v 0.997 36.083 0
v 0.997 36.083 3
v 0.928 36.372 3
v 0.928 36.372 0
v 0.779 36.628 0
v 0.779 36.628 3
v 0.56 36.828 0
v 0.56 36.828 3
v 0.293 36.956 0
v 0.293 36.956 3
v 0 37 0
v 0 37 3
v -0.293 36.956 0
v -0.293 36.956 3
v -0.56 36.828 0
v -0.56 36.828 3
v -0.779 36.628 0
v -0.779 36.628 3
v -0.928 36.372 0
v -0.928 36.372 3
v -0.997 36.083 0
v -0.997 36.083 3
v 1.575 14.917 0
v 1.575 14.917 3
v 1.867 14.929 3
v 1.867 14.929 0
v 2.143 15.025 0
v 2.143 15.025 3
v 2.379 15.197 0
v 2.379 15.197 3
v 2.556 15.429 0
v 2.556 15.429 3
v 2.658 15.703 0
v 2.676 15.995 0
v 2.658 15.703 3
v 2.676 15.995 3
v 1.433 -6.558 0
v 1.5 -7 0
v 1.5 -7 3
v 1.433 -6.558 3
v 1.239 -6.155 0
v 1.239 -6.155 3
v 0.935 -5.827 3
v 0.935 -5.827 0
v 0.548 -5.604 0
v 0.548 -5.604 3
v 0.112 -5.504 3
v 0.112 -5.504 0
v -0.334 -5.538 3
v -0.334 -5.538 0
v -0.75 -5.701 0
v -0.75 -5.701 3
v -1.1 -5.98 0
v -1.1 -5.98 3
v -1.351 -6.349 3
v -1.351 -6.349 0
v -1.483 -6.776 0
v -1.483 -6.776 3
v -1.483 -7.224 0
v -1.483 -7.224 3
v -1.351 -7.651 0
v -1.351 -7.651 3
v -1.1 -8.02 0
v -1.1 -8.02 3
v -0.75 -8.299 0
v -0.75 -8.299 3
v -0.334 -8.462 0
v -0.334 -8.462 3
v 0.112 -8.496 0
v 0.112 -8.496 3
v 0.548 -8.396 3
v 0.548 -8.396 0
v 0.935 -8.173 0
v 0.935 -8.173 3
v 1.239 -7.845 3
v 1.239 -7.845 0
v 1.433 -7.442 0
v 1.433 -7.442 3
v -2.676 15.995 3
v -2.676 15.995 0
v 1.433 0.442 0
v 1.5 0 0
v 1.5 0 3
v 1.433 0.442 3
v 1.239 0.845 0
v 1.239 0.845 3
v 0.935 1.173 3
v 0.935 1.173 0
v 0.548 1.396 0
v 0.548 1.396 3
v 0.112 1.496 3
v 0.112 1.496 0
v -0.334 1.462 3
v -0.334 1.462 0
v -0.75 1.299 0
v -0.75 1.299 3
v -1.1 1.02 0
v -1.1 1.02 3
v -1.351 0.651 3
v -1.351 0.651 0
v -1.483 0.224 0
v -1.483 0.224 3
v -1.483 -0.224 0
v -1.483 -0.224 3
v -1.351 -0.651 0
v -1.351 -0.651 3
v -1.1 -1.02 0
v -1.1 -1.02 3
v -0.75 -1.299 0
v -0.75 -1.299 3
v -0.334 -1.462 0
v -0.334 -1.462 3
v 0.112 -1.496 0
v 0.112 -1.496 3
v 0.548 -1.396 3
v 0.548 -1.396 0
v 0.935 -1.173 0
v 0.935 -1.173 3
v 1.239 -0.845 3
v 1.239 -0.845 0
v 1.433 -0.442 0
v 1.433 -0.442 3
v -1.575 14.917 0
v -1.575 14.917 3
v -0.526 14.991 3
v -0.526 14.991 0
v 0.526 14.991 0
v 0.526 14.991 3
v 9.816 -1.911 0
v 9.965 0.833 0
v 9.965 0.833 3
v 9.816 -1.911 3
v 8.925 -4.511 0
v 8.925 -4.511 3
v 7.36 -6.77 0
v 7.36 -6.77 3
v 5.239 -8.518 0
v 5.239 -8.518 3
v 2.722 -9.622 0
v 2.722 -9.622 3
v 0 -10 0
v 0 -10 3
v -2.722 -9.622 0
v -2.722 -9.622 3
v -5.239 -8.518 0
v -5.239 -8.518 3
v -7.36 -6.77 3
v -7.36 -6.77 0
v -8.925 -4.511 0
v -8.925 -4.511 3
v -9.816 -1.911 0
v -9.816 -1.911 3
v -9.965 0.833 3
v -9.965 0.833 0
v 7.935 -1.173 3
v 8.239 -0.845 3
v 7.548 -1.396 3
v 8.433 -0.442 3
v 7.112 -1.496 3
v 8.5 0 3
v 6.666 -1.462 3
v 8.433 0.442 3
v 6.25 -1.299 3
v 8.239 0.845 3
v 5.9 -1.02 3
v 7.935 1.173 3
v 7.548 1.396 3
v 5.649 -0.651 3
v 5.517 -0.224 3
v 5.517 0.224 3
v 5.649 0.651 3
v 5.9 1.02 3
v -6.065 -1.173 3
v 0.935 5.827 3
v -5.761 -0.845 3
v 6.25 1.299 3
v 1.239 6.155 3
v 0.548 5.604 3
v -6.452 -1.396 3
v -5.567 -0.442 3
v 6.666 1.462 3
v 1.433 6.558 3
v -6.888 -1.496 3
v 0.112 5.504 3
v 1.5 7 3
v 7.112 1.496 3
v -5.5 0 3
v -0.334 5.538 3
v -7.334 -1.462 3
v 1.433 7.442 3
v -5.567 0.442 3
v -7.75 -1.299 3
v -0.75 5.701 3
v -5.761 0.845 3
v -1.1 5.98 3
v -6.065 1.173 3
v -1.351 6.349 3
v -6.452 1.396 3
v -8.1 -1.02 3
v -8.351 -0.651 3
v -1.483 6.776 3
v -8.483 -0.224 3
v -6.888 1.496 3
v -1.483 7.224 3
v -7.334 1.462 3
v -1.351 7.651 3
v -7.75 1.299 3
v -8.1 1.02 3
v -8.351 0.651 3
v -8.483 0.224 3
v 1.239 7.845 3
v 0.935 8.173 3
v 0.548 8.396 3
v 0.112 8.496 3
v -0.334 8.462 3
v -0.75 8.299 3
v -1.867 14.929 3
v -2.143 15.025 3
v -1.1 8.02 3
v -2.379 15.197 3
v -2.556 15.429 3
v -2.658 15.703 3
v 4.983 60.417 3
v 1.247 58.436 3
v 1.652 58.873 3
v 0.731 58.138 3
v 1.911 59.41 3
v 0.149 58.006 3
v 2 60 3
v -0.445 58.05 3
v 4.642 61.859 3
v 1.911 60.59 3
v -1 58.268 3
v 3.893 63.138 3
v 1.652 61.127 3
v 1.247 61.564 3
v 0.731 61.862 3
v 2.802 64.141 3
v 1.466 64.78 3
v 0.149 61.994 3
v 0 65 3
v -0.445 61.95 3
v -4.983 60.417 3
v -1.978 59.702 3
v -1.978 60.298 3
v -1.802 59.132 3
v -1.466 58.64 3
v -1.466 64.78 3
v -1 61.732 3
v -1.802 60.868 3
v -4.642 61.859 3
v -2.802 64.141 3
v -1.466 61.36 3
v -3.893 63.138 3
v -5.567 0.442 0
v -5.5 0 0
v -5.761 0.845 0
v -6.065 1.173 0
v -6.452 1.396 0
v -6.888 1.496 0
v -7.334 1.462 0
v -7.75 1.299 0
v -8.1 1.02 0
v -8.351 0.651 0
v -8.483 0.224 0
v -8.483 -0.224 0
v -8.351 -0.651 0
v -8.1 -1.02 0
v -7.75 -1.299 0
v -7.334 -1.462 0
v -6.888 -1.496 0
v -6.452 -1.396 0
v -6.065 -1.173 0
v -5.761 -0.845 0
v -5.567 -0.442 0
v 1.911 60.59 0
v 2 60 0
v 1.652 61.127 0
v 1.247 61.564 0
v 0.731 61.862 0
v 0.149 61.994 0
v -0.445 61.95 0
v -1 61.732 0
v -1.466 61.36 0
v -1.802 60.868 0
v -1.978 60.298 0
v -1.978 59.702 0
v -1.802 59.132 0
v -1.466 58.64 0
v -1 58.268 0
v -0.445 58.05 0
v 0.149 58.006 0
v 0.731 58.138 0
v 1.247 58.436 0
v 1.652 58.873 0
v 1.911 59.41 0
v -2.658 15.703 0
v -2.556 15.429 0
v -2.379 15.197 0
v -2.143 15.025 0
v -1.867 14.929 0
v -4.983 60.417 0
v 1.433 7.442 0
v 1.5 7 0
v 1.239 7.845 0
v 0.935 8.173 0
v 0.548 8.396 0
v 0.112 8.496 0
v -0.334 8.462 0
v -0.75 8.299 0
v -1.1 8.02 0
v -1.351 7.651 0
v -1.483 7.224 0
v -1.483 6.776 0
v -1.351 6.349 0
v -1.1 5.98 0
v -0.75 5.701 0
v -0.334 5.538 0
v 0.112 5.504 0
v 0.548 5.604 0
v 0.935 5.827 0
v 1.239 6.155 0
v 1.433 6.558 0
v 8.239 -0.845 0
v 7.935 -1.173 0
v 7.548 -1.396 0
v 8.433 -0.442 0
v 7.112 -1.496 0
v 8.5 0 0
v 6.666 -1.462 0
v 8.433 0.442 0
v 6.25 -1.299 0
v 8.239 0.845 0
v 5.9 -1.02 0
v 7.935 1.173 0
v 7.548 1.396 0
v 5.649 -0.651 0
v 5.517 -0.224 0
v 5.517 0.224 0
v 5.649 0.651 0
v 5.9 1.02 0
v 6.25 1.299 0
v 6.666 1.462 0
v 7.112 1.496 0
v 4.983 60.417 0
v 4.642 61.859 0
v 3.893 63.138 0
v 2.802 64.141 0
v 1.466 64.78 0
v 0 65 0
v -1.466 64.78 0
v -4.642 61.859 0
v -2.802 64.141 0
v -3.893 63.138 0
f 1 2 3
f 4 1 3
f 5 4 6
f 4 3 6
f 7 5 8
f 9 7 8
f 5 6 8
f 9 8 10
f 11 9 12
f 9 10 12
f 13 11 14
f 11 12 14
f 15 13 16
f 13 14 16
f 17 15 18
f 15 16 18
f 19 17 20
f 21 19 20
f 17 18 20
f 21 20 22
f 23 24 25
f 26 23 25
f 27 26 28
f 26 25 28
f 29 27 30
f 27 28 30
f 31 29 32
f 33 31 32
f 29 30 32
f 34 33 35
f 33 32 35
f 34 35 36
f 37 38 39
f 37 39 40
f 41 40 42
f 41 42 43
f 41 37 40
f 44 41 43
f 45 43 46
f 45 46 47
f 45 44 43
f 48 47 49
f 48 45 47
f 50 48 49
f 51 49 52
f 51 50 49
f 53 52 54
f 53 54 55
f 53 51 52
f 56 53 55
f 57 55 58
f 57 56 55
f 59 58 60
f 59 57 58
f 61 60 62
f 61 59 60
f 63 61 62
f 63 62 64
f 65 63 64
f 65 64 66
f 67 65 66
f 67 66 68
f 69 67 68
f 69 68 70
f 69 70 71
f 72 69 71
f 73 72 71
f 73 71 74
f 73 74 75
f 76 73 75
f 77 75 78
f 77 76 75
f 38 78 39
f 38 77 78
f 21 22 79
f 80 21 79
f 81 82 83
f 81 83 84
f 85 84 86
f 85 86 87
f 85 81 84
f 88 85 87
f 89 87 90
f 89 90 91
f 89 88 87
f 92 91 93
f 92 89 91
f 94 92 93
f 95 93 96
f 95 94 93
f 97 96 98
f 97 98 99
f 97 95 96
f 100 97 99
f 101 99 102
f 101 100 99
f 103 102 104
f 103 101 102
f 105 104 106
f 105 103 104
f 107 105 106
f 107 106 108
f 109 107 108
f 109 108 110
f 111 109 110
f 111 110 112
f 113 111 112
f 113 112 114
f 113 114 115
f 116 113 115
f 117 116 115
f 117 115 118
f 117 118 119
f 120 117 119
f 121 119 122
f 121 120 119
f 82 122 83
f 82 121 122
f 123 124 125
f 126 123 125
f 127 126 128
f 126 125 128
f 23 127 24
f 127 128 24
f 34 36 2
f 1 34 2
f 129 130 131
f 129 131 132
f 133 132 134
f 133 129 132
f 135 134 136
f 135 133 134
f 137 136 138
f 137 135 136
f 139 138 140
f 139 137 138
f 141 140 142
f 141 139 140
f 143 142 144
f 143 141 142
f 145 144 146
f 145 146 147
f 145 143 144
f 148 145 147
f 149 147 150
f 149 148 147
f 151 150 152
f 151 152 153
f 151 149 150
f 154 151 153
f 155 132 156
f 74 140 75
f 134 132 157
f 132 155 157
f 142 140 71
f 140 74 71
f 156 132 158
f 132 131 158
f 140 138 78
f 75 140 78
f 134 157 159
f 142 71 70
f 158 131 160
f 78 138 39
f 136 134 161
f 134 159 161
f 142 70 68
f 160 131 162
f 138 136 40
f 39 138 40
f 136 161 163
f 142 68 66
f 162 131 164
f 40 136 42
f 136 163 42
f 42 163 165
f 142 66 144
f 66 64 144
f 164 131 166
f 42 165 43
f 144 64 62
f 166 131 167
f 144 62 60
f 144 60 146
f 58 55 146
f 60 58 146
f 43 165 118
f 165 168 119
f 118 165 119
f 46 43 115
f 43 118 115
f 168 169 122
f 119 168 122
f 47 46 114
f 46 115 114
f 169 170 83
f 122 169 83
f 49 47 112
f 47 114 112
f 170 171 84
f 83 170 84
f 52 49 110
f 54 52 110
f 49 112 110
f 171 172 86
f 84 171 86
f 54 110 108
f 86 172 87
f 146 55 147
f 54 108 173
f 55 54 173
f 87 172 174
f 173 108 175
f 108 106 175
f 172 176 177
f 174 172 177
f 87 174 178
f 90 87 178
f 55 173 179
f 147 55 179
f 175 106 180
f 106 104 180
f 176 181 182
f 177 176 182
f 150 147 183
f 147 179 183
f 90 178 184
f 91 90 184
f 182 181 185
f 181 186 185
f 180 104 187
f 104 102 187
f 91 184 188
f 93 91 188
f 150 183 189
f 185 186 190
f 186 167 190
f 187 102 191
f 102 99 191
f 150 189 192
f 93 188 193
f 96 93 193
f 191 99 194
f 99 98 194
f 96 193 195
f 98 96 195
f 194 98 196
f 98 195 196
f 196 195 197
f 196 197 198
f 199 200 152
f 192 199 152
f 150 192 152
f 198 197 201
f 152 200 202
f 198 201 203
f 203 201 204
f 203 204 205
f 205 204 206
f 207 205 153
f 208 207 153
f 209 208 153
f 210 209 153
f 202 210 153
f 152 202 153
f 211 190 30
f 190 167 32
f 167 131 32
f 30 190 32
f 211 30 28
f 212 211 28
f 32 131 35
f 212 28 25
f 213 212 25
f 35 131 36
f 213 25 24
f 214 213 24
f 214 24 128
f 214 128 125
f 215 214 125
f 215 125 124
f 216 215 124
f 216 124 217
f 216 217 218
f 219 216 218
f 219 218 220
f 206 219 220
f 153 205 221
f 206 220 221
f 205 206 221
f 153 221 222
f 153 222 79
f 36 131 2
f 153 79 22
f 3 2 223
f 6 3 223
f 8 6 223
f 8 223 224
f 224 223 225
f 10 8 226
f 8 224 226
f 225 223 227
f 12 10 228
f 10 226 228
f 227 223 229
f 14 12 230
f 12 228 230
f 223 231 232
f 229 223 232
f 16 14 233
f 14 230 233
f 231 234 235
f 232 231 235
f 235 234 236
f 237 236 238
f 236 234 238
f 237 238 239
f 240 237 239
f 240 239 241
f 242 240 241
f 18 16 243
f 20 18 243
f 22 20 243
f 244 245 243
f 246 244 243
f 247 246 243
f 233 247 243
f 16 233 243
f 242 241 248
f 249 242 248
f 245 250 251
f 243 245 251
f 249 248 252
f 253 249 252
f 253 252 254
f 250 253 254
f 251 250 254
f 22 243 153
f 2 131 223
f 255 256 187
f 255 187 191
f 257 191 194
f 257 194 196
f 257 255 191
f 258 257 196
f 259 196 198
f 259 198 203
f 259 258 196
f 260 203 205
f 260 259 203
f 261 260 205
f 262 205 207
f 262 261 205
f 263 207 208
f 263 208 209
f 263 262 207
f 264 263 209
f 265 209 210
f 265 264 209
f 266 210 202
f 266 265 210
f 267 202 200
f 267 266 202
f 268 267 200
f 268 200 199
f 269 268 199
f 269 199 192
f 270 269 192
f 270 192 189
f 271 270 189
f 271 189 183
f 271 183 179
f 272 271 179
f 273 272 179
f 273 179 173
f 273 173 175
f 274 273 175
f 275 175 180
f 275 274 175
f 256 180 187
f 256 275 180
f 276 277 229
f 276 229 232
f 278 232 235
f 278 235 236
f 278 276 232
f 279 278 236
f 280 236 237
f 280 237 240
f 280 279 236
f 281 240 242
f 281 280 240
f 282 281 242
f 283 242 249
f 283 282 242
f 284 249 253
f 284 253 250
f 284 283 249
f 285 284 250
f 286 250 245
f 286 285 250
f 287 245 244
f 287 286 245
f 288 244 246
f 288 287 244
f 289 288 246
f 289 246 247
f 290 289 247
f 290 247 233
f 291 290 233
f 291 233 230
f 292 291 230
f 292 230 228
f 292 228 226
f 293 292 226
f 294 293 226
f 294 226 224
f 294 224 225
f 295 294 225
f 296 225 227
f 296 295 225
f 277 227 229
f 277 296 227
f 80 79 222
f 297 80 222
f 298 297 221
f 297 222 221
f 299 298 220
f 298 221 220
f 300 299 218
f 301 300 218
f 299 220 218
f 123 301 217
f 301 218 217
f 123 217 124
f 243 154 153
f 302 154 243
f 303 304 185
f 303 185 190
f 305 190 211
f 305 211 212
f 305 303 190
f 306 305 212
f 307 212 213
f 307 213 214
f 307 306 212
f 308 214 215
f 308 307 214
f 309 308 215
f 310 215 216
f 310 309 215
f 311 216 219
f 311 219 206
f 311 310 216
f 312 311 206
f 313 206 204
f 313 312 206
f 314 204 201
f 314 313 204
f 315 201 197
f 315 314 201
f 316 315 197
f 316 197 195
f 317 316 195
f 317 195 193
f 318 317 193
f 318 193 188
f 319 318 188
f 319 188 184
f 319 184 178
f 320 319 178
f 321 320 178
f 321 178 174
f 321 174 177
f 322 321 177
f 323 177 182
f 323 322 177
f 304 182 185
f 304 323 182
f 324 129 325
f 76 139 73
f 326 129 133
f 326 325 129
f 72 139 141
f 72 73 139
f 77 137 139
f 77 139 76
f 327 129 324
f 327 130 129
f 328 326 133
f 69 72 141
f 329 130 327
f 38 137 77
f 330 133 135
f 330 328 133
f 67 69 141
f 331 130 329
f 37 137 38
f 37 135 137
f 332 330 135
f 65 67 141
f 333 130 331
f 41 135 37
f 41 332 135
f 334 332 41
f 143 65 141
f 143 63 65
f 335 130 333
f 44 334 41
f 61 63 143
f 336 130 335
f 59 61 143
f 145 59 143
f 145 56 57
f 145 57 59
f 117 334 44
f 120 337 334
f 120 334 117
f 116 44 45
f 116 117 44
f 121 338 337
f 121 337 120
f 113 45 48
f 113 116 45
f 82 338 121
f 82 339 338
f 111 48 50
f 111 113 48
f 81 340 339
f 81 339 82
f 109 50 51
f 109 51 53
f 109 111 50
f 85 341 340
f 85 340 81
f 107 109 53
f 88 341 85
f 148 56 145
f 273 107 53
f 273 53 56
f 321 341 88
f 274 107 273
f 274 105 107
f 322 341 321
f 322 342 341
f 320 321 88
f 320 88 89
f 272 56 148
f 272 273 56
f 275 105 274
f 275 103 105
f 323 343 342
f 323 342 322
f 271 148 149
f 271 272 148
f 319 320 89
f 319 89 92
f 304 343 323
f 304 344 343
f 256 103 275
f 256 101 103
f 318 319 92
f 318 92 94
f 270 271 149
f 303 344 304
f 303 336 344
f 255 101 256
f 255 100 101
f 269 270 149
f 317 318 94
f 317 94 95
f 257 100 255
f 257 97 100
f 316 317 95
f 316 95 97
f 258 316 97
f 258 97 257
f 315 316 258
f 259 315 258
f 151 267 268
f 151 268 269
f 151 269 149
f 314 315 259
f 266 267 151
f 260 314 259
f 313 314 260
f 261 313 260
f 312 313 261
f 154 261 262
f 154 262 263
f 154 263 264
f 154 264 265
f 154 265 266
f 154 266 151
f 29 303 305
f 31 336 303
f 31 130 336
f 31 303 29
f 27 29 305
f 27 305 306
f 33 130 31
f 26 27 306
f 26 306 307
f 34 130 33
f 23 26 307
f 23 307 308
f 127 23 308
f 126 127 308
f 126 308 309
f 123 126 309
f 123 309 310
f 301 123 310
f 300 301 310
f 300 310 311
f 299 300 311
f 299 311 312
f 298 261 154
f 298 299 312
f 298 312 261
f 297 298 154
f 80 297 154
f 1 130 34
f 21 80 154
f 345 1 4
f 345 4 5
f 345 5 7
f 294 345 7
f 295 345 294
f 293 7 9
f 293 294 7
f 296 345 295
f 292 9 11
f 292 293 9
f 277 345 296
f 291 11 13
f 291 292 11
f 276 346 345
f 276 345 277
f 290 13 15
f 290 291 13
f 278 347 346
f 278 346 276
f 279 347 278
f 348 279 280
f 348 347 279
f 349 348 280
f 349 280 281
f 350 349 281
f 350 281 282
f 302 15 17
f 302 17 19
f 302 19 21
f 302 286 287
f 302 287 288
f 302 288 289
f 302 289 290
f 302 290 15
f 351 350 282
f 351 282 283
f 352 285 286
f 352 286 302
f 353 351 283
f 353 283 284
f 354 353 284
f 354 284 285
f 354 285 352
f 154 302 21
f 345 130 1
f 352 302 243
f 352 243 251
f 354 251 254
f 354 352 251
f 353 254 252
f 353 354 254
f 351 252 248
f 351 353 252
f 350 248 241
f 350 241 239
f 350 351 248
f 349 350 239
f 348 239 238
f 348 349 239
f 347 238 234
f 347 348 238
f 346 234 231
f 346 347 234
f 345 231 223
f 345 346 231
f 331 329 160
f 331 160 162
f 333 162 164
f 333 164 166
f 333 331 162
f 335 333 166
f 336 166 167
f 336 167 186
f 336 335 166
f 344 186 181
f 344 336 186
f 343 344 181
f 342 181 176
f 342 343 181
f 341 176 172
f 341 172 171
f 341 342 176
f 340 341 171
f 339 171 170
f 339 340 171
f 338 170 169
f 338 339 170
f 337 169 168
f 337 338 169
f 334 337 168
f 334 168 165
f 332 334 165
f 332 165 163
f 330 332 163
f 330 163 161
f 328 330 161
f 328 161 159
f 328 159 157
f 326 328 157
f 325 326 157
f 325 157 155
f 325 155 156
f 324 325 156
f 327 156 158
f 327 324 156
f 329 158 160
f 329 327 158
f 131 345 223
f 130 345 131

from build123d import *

# Parameters (mm, degrees)
SKETCH_2_R          = 1.5
SKETCH_2_R_2        = 2
EXTRUDE_1_DEPTH     = 3
CUT_EXTRUDE_1_DEPTH = 66.833122363


with BuildPart() as part:
    # 草图2 → 凸台-拉伸1 (new body)
    with BuildSketch(Plane.XY):
        with BuildLine():
            Line((-9.965217286, 0.833333333), (-4.982608643, 60.416666667))
            ThreePointArc((-4.982608643, 60.416666667), (0, 65), (4.982608643, 60.416666667))
            Line((4.982608643, 60.416666667), (9.965217286, 0.833333333))
            ThreePointArc((9.965217286, 0.833333333), (0, -10), (-9.965217286, 0.833333333))
        make_face()
        Circle(SKETCH_2_R, mode=Mode.SUBTRACT)
        with Locations((0, 7)):
            Circle(SKETCH_2_R, mode=Mode.SUBTRACT)
        with Locations((7, 0)):
            Circle(SKETCH_2_R, mode=Mode.SUBTRACT)
        with Locations((0, -7)):
            Circle(SKETCH_2_R, mode=Mode.SUBTRACT)
        with Locations((-7, 0)):
            Circle(SKETCH_2_R, mode=Mode.SUBTRACT)
        with Locations((0, 60)):
            Circle(SKETCH_2_R_2, mode=Mode.SUBTRACT)
    extrude(amount=EXTRUDE_1_DEPTH)

    # 草图3 → 切除-拉伸1 (cut, through all)
    with BuildSketch(Plane.XY.offset(3)):
        with BuildLine():
            Line((2.676400777, 15.994901653), (0.996521729, 36.083333333))
            ThreePointArc((0.996521729, 36.083333333), (0, 37), (-0.996521729, 36.083333333))
            Line((-0.996521729, 36.083333333), (-2.676400777, 15.994901653))
            ThreePointArc((-2.676400777, 15.994901653), (-2.379252162, 15.196811544), (-1.574886608, 14.917095299))
            ThreePointArc((-1.574886608, 14.917095299), (0, 15), (1.574886608, 14.917095299))
            ThreePointArc((1.574886608, 14.917095299), (2.379252162, 15.196811544), (2.676400777, 15.994901653))
        make_face()
    extrude(amount=-CUT_EXTRUDE_1_DEPTH, mode=Mode.SUBTRACT)


solid = part.part
